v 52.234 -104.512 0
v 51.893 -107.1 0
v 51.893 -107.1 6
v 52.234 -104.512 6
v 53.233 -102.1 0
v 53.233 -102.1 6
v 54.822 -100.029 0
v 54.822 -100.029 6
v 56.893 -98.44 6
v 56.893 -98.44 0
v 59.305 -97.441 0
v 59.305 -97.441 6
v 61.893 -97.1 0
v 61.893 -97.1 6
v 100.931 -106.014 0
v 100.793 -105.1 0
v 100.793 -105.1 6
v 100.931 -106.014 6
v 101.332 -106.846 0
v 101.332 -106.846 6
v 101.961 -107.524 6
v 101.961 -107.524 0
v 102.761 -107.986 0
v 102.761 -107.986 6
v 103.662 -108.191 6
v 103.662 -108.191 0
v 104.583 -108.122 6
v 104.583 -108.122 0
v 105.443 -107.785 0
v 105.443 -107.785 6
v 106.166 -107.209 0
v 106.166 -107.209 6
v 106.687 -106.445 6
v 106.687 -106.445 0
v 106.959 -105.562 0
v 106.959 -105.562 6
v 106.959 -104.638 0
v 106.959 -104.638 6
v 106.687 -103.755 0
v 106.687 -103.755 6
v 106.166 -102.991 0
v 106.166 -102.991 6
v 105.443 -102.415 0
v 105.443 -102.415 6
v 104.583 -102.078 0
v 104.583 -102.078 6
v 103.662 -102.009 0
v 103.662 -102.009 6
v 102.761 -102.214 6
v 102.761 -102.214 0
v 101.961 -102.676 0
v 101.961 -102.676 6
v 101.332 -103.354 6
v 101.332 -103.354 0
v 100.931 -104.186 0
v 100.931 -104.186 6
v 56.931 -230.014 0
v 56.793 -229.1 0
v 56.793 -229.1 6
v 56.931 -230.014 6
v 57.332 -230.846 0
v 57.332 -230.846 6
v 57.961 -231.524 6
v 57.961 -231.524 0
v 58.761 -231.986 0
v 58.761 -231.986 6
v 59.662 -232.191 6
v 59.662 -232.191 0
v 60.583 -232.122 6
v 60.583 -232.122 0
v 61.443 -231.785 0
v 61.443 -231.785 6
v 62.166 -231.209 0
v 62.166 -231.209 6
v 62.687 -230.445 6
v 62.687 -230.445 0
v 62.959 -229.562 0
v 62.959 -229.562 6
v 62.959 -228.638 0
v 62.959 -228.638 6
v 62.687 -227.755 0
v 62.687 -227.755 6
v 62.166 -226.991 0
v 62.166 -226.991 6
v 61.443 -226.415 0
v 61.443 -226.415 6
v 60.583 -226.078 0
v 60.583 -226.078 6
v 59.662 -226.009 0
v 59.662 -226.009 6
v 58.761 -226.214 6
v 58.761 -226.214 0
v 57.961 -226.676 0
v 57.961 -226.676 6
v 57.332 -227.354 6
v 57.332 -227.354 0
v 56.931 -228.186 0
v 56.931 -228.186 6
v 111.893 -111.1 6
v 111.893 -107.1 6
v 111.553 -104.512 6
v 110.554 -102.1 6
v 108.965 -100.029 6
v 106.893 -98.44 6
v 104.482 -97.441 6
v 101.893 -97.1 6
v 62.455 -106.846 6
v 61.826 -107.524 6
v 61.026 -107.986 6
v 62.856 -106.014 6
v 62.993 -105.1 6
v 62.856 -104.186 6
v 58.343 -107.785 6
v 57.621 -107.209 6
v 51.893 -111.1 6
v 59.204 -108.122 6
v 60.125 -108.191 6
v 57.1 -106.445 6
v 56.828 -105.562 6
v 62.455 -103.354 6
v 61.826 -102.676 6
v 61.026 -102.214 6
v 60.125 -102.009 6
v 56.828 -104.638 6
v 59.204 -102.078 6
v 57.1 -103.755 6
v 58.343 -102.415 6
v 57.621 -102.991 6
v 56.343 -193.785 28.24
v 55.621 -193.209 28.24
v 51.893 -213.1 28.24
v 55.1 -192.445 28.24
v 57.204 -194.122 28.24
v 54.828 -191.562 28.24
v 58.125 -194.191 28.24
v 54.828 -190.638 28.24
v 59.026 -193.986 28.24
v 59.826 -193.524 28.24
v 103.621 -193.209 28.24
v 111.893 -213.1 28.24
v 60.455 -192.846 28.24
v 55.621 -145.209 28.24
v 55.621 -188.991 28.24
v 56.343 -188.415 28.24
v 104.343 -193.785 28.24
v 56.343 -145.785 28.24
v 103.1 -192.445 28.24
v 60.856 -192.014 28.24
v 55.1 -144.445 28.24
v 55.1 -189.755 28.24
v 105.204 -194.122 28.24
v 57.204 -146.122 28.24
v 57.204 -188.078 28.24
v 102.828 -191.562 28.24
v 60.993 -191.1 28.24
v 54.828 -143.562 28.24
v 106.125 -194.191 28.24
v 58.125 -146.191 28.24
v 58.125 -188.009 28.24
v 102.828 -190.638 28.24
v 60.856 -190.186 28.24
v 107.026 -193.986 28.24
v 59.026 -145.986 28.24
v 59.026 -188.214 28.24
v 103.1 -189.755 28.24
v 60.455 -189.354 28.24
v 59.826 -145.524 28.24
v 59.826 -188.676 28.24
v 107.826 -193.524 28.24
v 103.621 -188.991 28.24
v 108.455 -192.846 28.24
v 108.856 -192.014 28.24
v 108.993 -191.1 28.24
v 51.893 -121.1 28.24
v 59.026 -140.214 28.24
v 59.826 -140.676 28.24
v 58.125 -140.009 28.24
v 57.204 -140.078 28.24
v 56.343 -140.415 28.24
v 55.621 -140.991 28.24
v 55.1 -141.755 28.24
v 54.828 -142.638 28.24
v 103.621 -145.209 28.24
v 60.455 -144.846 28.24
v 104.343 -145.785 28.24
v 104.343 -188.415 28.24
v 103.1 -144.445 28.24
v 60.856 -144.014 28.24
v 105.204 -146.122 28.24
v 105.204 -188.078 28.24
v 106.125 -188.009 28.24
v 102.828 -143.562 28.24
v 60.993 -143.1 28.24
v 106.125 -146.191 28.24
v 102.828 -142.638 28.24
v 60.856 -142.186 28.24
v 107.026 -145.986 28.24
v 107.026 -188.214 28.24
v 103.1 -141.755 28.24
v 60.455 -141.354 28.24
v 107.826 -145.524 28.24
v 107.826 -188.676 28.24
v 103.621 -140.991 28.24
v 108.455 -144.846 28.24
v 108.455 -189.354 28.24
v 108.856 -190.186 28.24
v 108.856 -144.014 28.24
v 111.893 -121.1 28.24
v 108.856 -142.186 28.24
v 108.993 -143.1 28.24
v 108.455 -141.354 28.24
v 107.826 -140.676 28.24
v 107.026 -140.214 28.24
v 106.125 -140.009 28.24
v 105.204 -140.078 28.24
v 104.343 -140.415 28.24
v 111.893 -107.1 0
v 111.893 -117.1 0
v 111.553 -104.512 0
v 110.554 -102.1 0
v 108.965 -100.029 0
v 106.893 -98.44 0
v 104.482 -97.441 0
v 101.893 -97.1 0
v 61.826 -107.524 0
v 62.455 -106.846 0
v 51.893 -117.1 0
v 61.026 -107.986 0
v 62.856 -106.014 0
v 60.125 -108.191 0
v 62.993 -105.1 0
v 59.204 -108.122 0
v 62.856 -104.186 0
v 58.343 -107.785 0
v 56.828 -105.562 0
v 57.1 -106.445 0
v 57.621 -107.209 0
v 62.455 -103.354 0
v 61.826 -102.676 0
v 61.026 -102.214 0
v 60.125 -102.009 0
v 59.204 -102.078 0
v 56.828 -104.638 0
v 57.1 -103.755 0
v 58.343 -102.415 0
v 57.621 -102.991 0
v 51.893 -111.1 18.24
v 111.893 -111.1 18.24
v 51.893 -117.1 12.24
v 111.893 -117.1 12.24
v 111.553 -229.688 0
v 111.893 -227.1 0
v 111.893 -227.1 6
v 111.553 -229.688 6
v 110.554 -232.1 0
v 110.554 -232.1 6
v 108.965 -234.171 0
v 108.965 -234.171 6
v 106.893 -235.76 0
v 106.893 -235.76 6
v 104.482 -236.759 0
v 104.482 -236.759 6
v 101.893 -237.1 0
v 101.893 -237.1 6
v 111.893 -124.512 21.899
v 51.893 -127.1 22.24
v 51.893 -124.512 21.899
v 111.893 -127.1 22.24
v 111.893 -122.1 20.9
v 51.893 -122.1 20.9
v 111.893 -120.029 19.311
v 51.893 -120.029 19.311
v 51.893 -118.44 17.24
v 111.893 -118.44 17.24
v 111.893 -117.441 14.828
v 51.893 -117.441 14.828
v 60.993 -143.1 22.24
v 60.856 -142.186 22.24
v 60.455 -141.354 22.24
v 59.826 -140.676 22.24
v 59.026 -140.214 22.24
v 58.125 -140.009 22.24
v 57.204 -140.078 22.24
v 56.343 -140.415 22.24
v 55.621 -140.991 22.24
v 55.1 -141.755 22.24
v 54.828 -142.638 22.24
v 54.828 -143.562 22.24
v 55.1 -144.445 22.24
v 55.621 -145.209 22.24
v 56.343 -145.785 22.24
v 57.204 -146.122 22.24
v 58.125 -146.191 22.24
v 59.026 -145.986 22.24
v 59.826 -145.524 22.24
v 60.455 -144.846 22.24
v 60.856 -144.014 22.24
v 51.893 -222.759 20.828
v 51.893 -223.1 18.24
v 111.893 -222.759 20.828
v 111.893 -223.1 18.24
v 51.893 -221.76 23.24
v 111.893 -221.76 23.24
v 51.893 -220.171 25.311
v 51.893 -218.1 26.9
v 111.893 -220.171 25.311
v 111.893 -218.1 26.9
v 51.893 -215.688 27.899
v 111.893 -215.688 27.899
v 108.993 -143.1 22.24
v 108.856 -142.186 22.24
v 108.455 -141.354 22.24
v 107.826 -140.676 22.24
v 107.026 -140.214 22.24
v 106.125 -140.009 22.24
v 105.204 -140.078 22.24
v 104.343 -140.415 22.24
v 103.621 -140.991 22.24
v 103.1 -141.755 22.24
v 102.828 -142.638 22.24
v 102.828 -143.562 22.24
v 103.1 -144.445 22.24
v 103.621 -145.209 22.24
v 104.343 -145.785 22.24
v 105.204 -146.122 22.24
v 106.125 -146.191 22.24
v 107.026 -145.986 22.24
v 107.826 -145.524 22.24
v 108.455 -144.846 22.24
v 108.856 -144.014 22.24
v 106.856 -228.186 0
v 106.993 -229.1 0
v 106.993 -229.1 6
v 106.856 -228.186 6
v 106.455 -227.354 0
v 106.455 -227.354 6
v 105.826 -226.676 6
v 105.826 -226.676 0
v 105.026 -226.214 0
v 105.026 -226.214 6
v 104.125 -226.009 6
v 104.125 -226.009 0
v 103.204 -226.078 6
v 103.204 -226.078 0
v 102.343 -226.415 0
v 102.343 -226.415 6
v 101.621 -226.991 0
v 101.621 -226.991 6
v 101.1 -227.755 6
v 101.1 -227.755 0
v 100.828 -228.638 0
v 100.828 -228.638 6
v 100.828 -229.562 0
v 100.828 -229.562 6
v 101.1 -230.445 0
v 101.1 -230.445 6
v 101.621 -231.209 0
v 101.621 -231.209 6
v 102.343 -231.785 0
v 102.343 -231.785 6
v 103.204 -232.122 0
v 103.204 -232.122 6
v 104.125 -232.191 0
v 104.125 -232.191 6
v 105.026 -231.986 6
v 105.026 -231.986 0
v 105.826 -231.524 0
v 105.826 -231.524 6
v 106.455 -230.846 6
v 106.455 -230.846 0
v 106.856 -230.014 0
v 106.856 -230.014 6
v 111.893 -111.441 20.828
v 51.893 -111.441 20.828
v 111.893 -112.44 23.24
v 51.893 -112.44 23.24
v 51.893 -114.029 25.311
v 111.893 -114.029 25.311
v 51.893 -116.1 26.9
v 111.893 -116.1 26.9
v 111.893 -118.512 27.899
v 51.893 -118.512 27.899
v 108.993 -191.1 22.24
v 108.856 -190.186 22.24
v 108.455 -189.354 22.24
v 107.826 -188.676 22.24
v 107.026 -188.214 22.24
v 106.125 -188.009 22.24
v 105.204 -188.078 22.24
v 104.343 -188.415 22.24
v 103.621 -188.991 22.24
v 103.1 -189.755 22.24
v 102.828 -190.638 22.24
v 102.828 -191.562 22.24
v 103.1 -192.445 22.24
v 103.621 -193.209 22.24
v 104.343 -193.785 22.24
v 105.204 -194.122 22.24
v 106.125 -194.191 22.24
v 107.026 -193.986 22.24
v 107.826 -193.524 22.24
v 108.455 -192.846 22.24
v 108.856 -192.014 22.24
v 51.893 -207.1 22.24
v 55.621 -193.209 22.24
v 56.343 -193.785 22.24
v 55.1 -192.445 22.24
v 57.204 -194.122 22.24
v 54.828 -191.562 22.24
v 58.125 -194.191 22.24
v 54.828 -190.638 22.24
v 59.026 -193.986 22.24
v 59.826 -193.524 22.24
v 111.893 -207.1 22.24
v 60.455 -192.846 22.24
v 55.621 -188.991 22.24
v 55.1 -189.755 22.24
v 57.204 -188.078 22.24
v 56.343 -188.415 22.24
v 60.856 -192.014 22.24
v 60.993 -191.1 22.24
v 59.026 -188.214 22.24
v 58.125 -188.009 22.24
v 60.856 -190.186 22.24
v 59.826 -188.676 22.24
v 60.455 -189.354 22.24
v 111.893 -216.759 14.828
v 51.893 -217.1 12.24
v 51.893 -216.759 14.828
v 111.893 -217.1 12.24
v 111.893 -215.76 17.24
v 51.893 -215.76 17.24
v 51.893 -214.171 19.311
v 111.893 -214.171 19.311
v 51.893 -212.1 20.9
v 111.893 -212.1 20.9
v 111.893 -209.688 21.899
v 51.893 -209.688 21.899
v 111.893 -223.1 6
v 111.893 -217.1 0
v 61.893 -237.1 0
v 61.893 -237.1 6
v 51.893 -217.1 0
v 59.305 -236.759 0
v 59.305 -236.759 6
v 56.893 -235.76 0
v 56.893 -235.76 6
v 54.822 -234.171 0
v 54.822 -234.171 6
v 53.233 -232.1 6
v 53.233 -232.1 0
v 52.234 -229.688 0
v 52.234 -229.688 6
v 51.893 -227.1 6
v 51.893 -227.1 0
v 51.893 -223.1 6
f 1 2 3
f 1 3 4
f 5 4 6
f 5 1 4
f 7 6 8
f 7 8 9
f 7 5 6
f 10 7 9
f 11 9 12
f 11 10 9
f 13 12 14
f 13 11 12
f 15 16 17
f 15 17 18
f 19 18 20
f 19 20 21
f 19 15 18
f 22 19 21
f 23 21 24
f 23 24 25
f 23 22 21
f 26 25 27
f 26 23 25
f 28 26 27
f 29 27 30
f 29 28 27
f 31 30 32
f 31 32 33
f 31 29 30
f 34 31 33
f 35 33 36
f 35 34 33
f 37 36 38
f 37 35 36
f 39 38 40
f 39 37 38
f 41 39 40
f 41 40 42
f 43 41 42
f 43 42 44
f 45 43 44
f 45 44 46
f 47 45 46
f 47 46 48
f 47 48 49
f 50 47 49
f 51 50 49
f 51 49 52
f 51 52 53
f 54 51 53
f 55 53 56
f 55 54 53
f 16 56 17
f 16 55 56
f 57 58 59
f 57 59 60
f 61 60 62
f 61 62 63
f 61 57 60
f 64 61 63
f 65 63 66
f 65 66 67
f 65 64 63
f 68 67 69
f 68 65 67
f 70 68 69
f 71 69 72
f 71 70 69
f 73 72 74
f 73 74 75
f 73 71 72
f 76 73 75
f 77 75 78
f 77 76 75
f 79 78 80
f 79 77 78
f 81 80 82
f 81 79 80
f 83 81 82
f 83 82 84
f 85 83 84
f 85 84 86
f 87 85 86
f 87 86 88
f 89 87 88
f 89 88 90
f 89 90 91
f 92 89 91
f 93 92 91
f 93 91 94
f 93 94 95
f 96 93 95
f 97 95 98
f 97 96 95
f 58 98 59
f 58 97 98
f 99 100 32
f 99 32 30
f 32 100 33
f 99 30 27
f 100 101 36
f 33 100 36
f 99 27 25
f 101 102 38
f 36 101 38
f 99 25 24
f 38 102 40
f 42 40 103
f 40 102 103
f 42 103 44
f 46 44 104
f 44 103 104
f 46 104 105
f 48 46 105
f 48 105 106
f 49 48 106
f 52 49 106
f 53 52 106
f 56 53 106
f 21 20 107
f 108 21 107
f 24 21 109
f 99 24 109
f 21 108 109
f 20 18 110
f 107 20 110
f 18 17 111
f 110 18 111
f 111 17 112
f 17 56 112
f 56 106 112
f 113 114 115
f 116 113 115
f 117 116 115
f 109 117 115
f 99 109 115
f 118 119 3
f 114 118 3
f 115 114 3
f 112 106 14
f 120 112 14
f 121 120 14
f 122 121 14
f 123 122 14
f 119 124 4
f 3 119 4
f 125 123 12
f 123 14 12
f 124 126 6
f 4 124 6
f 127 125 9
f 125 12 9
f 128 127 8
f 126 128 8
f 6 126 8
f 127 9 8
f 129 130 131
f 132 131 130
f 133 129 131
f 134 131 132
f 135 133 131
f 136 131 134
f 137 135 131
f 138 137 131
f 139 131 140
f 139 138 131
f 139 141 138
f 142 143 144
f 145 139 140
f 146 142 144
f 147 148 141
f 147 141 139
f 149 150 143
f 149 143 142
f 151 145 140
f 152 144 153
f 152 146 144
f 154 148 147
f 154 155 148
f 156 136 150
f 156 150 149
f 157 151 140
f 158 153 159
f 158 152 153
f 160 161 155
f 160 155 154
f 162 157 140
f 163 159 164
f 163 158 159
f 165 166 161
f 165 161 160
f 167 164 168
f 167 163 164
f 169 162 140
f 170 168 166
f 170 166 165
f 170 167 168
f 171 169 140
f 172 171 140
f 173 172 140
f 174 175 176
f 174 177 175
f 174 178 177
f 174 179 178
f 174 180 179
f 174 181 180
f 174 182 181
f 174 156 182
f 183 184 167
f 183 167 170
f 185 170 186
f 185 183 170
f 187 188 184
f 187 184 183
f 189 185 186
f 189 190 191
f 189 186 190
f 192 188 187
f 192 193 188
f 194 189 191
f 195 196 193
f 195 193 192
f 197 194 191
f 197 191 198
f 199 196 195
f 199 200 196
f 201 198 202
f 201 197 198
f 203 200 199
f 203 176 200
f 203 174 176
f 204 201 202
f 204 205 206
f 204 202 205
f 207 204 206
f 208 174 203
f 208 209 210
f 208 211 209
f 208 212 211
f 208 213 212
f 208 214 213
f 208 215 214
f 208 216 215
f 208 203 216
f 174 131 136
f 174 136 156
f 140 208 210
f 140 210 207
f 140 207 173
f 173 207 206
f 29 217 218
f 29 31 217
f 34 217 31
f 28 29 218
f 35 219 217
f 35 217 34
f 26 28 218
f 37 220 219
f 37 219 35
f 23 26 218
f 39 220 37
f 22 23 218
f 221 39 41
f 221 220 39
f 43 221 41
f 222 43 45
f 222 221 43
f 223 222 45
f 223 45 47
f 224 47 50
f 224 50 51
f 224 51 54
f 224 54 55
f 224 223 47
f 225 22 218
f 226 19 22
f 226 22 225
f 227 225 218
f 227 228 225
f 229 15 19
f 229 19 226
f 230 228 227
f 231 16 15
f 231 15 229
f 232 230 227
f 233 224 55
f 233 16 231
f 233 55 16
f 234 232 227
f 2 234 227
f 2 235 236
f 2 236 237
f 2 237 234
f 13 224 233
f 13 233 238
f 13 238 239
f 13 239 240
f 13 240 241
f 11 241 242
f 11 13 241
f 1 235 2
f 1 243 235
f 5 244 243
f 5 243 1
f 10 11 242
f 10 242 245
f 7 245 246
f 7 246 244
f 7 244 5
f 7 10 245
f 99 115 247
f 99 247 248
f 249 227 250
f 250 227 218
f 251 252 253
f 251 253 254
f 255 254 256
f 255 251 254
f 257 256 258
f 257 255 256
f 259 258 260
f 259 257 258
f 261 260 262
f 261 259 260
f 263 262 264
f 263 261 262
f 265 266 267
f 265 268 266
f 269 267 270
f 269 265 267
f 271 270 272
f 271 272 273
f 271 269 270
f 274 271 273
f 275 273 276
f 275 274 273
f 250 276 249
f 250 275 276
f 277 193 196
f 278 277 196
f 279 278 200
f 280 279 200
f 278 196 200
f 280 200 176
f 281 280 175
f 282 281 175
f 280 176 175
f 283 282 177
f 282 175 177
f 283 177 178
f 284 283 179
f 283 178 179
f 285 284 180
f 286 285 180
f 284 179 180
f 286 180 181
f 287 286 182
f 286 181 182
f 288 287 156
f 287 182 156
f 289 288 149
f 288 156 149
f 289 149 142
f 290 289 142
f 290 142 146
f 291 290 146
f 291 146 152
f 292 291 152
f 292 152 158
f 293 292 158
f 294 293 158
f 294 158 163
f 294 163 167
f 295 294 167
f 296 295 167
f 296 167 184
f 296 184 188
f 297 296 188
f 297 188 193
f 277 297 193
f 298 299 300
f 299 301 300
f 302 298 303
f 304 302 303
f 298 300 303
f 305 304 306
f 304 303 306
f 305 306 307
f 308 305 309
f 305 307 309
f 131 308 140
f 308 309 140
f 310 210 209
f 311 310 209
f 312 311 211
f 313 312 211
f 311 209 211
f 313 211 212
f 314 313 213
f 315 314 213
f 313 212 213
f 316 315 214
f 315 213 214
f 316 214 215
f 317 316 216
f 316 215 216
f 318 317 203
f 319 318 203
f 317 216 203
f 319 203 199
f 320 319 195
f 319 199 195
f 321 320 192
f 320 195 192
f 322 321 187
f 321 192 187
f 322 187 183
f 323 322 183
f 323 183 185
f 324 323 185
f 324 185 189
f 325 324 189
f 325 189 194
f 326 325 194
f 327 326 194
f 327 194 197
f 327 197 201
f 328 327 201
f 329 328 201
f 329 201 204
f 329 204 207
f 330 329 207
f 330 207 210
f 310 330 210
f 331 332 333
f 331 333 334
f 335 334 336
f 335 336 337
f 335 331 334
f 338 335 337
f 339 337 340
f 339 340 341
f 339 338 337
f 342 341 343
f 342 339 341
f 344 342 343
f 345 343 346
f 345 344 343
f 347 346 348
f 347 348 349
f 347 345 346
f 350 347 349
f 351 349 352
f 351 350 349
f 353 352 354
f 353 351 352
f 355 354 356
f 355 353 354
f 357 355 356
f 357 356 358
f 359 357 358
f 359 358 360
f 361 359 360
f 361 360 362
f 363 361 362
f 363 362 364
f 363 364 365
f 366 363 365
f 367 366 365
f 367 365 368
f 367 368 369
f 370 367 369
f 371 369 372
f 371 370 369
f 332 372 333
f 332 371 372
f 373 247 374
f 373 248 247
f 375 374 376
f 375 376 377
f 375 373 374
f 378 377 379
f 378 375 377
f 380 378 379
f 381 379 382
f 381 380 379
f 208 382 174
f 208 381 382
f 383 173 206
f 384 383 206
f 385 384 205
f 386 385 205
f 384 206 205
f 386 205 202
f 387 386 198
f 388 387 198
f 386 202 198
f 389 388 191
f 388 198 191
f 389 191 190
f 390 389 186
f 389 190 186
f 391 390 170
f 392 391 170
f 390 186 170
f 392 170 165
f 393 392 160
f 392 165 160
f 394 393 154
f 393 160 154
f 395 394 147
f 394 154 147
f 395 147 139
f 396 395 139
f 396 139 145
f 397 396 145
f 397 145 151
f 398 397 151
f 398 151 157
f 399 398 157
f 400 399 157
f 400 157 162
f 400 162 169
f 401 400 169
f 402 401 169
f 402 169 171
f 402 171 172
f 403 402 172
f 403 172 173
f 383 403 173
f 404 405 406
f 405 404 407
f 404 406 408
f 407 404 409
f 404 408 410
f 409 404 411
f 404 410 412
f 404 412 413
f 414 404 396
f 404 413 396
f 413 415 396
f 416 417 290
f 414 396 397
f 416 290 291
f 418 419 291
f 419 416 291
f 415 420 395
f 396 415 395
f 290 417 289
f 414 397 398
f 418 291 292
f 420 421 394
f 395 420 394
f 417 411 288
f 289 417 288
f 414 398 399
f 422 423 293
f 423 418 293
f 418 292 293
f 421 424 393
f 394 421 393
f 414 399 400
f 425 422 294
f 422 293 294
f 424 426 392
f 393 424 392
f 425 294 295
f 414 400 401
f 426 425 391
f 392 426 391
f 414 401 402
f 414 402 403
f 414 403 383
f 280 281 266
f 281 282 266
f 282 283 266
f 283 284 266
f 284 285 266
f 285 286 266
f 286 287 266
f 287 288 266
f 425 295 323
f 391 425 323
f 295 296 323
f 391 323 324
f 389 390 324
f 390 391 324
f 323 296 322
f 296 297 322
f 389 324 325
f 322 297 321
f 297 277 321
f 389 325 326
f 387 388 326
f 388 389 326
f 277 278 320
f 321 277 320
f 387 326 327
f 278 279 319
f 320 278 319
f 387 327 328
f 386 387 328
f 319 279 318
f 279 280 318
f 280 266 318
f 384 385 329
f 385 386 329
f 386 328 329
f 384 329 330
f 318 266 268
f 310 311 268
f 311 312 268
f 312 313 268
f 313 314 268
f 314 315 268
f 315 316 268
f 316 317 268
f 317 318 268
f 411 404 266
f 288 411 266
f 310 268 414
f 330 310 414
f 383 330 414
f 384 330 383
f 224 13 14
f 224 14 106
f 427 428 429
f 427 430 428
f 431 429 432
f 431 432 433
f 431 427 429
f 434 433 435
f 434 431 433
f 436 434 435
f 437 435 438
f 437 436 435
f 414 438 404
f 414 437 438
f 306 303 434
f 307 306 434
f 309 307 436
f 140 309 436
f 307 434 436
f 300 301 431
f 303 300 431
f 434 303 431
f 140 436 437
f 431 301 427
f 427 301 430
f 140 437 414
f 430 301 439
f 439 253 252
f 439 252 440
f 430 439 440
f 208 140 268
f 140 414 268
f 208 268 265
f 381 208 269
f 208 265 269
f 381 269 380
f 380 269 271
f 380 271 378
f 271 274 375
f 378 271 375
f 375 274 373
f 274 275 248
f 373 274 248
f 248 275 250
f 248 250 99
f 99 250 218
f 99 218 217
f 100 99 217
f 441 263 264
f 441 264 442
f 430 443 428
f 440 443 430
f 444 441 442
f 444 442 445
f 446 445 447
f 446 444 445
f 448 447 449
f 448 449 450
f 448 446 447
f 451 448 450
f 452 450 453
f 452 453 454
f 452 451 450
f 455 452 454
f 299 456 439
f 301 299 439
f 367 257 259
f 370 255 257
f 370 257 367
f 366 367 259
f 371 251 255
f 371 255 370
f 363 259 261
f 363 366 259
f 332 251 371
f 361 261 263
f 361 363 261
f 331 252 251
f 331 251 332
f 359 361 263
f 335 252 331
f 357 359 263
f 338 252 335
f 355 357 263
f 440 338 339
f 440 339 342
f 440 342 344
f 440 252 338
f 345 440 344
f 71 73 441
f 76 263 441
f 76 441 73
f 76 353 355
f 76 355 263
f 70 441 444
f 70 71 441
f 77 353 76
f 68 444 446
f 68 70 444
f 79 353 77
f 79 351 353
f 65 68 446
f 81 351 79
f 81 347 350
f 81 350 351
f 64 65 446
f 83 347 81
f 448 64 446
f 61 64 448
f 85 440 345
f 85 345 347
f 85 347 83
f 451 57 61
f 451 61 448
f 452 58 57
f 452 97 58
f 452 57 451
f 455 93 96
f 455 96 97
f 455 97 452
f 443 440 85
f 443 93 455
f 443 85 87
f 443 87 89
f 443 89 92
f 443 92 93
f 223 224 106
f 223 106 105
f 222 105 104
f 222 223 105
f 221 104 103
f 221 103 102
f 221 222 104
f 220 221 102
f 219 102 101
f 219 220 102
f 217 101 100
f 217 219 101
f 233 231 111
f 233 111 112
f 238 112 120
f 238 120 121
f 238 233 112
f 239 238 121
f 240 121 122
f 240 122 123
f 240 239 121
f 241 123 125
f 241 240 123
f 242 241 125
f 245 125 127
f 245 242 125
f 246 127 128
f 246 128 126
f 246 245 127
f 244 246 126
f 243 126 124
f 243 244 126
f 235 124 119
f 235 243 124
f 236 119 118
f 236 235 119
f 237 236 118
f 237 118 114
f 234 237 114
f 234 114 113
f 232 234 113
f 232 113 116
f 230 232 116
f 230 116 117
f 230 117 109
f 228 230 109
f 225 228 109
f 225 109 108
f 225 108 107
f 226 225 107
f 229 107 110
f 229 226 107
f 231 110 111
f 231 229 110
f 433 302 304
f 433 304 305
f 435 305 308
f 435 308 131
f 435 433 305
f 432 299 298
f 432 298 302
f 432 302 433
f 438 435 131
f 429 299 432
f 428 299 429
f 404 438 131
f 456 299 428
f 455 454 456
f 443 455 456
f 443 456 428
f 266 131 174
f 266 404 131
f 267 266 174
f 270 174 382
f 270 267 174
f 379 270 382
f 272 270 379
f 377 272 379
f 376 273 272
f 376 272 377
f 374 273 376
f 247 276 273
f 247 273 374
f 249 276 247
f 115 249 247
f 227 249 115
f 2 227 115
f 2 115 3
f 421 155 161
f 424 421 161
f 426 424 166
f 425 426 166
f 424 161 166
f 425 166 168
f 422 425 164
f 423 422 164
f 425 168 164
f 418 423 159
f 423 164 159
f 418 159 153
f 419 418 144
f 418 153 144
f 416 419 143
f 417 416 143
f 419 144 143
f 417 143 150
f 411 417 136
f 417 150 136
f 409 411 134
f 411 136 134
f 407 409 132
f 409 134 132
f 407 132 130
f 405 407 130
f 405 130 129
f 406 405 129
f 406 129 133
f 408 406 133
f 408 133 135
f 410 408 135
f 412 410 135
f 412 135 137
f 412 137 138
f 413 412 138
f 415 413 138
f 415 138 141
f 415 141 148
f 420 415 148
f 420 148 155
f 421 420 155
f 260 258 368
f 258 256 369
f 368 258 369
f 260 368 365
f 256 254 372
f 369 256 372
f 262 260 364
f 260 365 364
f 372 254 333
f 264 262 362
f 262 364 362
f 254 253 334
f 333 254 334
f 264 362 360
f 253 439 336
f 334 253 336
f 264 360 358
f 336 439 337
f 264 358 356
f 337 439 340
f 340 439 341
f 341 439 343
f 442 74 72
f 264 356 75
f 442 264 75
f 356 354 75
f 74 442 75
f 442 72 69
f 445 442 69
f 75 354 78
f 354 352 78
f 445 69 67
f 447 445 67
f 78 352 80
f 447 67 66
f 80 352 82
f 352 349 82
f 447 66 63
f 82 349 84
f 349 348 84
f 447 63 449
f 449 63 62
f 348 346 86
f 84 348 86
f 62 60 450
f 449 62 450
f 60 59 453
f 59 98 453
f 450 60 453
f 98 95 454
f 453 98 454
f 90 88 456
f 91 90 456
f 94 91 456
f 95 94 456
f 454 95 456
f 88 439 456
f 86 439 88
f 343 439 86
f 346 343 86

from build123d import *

# Parameters (mm, degrees)
CROQUIS1_R                = 3.1
SALIENTE_EXTRUIR1_DEPTH   = 6
SALIENTE_EXTRUIR1_2_DEPTH = 6
CROQUIS3_W                = 60
CROQUIS3_H                = 6
SALIENTE_EXTRUIR2_DEPTH   = 16.24
CROQUIS4_W                = 60
CROQUIS4_H                = 112
SALIENTE_EXTRUIR3_DEPTH   = 6
REDONDEO1_R               = 10
CROQUIS5_R                = 3.1
CORTAR_EXTRUIR1_DEPTH     = 264.693121755


with BuildPart() as part:
    # Croquis1 → Saliente-Extruir1 (new body)
    with BuildSketch(Plane.XY):
        with BuildLine():
            Line((51.893497848, -217.1), (111.893497848, -217.1))
            Line((111.893497848, -217.1), (111.893497848, -227.1))
            ThreePointArc((111.893497848, -227.1), (108.96456566, -234.171067812), (101.893497848, -237.1))
            Line((101.893497848, -237.1), (61.893497848, -237.1))
            ThreePointArc((61.893497848, -237.1), (54.822430037, -234.171067812), (51.893497848, -227.1))
            Line((51.893497848, -227.1), (51.893497848, -217.1))
        make_face()
        with Locations(Location((59.893497848, -229.1, 0), (0, 0, 180))):
            Circle(CROQUIS1_R, mode=Mode.SUBTRACT)
        with Locations((103.893497848, -229.1)):
            Circle(CROQUIS1_R, mode=Mode.SUBTRACT)
    extrude(amount=SALIENTE_EXTRUIR1_DEPTH)



with BuildPart() as body_2:
    # Croquis1 → Saliente-Extruir1 2 (new body)
    with BuildSketch(Plane.XY):
        with BuildLine():
            Line((61.893497848, -97.1), (101.893497848, -97.1))
            ThreePointArc((101.893497848, -97.1), (108.96456566, -100.028932188), (111.893497848, -107.1))
            Line((111.893497848, -107.1), (111.893497848, -117.1))
            Line((111.893497848, -117.1), (51.893497848, -117.1))
            Line((51.893497848, -117.1), (51.893497848, -107.1))
            ThreePointArc((51.893497848, -107.1), (54.822430037, -100.028932188), (61.893497848, -97.1))
        make_face()
        with Locations((59.893497848, -105.1)):
            Circle(CROQUIS1_R, mode=Mode.SUBTRACT)
        with Locations(Location((103.893497848, -105.1, 0), (0, 0, 180))):
            Circle(CROQUIS1_R, mode=Mode.SUBTRACT)
    extrude(amount=SALIENTE_EXTRUIR1_2_DEPTH)


with BuildPart() as part_1:
    add(part.part)

    add(body_2.part)  # Saliente-Extruir2 merges body 2
    # Croquis3 → Saliente-Extruir2 (add)
    with BuildSketch(Plane.XY.offset(6)):
        with Locations((81.893497848, -220.1)):
            Rectangle(CROQUIS3_W, CROQUIS3_H)
        with Locations((81.893497848, -114.1)):
            Rectangle(CROQUIS3_W, CROQUIS3_H)
    extrude(amount=SALIENTE_EXTRUIR2_DEPTH)

    # Croquis4 → Saliente-Extruir3 (add)
    with BuildSketch(Plane.XY.offset(22.24)):
        with Locations((81.893497848, -167.1)):
            Rectangle(CROQUIS4_W, CROQUIS4_H)
    extrude(amount=SALIENTE_EXTRUIR3_DEPTH)

    # Redondeo1
    redondeo1_edges = [part_1.edges().sort_by_distance(p)[0] for p in [
        (81.893497848, -217.1, 22.24),
        (81.893497848, -223.1, 28.24),
        (81.893497848, -111.1, 28.24),
        (81.893497848, -117.1, 22.24),
    ]]
    fillet(redondeo1_edges, radius=REDONDEO1_R)

    # Croquis5 → Cortar-Extruir1 (cut, through all)
    with BuildSketch(Plane.XY.offset(28.24)):
        with Locations((105.893497848, -143.1)):
            Circle(CROQUIS5_R)
        with Locations((105.893497848, -191.1)):
            Circle(CROQUIS5_R)
        with Locations((57.893497848, -191.1)):
            Circle(CROQUIS5_R)
        with Locations((57.893497848, -143.1)):
            Circle(CROQUIS5_R)
    extrude(amount=-CORTAR_EXTRUIR1_DEPTH, mode=Mode.SUBTRACT)


solid = part_1.part
